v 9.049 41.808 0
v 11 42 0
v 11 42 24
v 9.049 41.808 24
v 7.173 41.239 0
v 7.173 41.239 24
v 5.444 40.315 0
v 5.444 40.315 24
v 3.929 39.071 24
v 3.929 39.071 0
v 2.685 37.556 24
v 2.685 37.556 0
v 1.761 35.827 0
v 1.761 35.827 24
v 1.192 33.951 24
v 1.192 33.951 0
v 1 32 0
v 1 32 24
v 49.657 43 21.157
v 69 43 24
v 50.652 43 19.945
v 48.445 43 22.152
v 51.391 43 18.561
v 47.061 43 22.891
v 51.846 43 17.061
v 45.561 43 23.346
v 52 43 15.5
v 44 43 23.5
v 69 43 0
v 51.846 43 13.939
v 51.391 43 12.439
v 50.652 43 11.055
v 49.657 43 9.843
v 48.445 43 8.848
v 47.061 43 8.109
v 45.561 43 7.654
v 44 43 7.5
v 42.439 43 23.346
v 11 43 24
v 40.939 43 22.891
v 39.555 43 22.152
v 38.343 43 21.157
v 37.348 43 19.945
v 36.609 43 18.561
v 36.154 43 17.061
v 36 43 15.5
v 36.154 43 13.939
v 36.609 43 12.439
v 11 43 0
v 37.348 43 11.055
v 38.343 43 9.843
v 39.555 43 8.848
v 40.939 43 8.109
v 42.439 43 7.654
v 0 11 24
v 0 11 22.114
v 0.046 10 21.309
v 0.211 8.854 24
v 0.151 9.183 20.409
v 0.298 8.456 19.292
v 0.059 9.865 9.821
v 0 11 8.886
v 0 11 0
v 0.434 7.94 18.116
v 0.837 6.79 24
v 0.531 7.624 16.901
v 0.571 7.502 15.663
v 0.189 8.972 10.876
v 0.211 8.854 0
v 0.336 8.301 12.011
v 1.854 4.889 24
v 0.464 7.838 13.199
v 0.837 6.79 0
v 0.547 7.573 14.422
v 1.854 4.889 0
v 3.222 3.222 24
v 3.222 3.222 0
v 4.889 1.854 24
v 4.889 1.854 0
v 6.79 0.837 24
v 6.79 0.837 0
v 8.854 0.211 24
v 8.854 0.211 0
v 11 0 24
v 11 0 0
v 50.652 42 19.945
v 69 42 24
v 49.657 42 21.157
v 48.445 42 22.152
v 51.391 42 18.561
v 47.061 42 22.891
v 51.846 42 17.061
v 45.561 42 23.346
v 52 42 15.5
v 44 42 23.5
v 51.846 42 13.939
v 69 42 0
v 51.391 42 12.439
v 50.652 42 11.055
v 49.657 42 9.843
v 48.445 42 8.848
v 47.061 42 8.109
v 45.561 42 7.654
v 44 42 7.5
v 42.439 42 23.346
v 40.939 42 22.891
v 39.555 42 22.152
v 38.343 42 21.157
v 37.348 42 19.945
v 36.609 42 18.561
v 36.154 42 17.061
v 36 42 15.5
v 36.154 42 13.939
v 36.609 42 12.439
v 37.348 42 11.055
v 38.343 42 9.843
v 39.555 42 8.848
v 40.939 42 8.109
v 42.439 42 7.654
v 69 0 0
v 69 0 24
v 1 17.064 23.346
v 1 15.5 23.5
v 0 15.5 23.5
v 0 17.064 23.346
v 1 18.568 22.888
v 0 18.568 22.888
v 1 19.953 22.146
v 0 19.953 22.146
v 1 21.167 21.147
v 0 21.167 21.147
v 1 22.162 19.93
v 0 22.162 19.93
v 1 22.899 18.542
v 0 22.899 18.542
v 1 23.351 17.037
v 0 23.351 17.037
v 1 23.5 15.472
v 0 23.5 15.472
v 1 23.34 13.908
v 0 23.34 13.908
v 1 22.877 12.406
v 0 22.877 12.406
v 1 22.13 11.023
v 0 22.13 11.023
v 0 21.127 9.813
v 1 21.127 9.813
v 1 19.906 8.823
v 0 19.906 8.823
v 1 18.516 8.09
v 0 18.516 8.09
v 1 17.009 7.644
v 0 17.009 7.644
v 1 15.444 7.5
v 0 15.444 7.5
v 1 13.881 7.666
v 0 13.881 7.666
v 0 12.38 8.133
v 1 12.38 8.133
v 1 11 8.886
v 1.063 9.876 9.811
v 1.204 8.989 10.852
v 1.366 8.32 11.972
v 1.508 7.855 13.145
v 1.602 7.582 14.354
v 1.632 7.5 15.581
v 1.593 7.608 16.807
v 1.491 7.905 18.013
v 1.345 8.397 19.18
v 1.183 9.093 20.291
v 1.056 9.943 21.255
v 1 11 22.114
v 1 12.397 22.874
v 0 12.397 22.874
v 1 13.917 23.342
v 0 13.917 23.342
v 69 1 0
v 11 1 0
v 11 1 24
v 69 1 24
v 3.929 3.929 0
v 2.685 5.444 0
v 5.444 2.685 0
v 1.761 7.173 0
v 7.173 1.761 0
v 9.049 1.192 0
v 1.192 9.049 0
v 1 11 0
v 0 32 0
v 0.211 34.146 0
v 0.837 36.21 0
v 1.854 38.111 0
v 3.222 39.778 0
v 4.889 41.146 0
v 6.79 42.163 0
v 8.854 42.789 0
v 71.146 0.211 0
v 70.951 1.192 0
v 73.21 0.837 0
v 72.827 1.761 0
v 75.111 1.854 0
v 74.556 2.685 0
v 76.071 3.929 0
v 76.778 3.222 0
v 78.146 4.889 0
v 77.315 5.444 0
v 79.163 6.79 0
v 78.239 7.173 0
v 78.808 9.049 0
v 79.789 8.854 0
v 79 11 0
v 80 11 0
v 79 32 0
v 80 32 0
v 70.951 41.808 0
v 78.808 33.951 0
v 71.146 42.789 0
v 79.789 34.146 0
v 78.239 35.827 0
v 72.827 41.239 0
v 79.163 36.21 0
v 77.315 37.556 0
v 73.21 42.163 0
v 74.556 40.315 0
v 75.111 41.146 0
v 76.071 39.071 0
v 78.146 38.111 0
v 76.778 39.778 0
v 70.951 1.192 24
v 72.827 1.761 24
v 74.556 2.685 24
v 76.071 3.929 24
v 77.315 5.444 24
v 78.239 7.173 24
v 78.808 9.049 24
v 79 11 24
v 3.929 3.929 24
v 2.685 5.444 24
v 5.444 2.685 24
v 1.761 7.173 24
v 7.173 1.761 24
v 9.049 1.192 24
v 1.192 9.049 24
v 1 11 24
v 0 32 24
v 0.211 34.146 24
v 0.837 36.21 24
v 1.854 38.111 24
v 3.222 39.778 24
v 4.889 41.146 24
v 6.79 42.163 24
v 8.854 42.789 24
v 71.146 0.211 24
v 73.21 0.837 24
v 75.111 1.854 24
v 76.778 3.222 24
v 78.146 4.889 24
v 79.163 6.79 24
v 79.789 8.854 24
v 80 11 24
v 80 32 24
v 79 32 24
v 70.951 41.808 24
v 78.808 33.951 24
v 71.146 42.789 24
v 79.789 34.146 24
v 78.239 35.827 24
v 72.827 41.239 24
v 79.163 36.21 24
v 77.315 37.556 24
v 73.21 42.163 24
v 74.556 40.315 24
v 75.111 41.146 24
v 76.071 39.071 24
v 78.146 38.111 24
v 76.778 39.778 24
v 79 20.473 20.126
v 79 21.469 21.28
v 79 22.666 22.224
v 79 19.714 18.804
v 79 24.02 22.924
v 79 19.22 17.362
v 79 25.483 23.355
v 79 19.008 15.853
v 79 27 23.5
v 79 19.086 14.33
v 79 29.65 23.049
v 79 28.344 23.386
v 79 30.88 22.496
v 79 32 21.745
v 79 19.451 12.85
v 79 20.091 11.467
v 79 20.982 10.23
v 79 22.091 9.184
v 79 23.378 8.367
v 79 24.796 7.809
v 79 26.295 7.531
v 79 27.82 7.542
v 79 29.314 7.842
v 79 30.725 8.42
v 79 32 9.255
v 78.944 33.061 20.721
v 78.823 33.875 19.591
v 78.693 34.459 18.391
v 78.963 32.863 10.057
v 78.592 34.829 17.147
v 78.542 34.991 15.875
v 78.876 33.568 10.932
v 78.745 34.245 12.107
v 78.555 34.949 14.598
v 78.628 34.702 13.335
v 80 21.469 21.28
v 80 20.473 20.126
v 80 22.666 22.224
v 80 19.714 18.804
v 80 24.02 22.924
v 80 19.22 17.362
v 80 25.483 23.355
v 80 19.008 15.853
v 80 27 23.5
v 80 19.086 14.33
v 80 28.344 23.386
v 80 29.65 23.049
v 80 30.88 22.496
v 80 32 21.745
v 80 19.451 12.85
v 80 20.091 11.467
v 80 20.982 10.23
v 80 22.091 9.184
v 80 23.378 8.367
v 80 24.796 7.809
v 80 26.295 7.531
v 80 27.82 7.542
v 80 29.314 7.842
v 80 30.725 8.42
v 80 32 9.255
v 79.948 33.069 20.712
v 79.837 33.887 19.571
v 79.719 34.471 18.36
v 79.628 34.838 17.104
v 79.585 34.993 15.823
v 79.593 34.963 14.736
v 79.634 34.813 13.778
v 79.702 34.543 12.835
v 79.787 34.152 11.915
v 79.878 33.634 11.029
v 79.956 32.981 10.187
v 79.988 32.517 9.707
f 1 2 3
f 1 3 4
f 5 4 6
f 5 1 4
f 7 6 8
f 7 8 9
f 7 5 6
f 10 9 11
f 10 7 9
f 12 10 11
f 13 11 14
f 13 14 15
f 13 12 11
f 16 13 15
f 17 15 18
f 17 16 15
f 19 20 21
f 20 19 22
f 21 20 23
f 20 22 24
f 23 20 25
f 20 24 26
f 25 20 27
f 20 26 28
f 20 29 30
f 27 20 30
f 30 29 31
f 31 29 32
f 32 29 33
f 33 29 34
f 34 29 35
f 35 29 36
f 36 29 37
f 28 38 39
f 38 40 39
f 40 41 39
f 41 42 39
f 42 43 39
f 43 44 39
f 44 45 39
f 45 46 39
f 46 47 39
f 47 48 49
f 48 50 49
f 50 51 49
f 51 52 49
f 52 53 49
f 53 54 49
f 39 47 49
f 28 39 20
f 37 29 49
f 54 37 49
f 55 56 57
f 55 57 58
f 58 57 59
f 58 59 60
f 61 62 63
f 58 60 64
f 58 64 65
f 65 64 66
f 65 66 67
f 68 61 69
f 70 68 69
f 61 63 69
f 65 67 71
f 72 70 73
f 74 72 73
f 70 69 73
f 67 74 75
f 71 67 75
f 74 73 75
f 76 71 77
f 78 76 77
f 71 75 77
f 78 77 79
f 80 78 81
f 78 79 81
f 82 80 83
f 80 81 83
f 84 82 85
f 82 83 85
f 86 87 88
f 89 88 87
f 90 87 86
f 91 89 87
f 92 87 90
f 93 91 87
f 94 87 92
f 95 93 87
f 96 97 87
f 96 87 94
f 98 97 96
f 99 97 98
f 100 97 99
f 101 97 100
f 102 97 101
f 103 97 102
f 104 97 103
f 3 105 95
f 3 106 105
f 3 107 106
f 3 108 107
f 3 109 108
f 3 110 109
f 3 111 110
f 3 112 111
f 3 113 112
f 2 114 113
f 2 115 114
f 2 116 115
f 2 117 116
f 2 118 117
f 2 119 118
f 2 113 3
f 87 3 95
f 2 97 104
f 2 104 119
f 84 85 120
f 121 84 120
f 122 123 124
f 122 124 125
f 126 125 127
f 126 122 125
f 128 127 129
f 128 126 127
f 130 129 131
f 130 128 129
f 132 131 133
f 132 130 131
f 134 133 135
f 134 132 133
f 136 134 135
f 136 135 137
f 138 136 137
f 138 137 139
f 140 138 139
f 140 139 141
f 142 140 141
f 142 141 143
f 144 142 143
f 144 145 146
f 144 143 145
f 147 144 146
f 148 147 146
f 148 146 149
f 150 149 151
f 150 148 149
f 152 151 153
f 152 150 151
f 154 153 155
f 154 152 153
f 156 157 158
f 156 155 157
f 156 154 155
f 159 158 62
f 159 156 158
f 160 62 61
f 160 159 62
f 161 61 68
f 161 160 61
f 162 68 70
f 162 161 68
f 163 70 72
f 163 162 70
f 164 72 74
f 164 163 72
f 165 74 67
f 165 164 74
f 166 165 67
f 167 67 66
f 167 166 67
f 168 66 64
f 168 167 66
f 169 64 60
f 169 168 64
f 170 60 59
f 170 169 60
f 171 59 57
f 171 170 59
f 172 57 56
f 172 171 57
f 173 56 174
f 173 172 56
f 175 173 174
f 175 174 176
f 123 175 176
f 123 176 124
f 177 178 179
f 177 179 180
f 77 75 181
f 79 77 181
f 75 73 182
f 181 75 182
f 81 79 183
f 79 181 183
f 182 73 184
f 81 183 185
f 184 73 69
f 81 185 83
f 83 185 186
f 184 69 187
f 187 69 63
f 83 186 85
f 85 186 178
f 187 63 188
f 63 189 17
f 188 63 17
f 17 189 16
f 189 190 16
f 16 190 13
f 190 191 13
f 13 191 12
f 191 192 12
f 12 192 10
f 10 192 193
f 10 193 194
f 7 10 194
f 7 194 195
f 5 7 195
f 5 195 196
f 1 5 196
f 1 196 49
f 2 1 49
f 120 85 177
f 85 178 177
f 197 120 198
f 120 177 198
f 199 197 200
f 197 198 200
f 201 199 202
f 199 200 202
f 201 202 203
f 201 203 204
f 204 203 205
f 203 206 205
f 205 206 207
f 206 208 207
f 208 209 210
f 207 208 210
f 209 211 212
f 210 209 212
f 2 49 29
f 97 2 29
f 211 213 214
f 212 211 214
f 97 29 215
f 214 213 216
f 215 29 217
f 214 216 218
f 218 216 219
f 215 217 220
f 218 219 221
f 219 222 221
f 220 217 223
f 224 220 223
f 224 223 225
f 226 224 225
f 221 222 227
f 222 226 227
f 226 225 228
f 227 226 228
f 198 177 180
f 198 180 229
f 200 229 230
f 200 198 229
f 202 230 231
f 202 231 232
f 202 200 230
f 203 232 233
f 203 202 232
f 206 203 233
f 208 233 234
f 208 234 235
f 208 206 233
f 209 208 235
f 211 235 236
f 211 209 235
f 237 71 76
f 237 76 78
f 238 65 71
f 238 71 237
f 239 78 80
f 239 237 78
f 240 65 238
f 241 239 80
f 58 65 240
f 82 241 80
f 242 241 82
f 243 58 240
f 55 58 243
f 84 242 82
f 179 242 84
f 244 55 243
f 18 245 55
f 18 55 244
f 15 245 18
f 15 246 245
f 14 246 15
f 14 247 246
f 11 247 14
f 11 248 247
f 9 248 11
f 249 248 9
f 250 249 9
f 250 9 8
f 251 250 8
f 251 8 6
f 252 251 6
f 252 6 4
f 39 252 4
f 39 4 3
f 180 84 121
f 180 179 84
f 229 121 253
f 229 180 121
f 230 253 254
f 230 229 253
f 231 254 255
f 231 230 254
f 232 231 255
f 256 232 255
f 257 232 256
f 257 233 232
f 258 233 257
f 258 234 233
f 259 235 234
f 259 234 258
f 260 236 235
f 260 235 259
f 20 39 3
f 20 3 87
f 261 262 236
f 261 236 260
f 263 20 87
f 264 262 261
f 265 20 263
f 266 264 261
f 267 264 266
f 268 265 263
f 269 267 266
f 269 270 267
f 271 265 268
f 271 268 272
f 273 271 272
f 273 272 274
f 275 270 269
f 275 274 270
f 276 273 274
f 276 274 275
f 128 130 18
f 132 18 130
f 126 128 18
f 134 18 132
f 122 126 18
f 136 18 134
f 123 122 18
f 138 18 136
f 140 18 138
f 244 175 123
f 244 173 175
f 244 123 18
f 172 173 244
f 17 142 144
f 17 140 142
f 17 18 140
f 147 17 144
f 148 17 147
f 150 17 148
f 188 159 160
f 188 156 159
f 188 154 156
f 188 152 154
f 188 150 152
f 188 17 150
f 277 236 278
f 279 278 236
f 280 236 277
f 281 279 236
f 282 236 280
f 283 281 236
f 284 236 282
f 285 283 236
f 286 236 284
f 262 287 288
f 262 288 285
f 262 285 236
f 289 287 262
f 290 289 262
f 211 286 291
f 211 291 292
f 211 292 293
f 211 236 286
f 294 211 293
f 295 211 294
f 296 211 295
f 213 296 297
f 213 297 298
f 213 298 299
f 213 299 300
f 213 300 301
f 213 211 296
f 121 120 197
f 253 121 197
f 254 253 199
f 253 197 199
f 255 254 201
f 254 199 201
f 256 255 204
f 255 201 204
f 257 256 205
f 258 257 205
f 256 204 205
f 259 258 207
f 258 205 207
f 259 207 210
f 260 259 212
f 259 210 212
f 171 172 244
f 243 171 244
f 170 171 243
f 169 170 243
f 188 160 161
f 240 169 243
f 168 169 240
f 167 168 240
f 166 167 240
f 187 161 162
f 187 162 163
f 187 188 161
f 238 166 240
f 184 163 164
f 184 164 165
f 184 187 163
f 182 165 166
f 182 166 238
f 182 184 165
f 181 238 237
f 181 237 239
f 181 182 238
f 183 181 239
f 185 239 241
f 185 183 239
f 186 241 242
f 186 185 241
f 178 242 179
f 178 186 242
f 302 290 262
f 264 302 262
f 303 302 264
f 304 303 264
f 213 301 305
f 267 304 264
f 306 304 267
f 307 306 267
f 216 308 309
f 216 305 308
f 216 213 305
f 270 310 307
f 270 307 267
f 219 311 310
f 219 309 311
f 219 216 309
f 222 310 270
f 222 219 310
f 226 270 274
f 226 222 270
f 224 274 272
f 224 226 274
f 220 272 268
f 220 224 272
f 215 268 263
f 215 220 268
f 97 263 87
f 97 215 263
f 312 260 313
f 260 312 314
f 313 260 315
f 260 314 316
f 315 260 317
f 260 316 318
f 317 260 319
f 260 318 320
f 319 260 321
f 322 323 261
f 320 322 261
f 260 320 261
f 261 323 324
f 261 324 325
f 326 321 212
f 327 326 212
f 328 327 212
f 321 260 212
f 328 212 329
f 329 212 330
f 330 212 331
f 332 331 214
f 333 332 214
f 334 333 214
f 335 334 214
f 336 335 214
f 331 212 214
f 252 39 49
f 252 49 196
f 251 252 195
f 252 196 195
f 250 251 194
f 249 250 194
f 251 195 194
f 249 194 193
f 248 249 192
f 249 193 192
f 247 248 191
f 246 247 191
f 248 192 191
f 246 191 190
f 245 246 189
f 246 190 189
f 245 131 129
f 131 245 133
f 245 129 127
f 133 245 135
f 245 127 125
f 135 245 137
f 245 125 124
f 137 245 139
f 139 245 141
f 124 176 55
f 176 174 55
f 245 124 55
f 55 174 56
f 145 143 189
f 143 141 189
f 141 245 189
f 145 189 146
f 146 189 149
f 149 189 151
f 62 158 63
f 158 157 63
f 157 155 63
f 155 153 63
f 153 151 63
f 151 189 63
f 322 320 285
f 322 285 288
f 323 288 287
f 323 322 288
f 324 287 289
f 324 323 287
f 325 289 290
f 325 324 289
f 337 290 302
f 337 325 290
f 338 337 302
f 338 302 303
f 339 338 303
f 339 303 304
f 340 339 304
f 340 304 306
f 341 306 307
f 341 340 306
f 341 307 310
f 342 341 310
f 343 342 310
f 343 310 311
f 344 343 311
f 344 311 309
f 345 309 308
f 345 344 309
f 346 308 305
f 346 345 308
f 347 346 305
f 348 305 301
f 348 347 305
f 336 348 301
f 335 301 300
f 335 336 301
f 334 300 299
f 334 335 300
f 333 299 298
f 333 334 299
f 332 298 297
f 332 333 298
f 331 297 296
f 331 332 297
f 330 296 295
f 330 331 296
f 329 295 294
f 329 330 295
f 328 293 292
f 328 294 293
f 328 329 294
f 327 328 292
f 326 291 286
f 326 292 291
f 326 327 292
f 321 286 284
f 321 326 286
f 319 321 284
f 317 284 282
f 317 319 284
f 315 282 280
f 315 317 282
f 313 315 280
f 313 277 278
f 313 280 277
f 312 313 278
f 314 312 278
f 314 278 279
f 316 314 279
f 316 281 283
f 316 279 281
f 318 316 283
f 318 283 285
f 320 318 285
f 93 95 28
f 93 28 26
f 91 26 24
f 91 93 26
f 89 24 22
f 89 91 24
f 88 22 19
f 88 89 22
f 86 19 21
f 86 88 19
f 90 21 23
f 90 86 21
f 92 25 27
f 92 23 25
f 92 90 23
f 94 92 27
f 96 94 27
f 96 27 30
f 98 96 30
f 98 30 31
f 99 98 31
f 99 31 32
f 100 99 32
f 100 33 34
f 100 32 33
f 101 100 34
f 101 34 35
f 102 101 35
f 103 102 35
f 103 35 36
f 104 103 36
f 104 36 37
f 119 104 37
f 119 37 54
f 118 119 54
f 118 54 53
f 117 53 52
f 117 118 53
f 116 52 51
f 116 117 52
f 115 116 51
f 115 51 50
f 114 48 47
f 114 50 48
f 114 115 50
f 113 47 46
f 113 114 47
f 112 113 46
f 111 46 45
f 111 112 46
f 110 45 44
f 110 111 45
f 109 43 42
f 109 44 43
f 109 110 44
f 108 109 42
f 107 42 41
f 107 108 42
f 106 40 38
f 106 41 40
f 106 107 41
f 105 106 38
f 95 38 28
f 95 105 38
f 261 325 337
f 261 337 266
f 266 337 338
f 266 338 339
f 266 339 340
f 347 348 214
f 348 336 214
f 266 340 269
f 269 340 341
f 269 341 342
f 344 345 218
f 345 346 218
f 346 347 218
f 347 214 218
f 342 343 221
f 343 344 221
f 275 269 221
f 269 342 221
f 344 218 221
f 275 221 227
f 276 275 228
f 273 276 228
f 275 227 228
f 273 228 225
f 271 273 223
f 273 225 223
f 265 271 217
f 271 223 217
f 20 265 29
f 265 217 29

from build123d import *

# Parameters (mm, degrees)
CYLINDER033_R     = 8
CYLINDER033_DEPTH = 10
CYLINDER034_R     = 8
CYLINDER034_DEPTH = 10
CYLINDER042_R     = 8
CYLINDER042_DEPTH = 10
PAD_DEPTH         = 24


with BuildPart() as b_w:
    # Cylinder033 → Cylinder033 (new body)
    with BuildSketch(Plane(origin=(5, 15.5, 15.5), x_dir=(0, 0, 1), z_dir=(-1, 0, 0))):
        Circle(CYLINDER033_R)
    extrude(amount=CYLINDER033_DEPTH)


with BuildPart() as b_o:
    # Cylinder034 → Cylinder034 (new body)
    with BuildSketch(Plane(origin=(85, 27, 15.5), x_dir=(0, 0, 1), z_dir=(-1, 0, 0))):
        Circle(CYLINDER034_R)
    extrude(amount=CYLINDER034_DEPTH)


with BuildPart() as b_n001:
    # Cylinder042 → Cylinder042 (new body)
    with BuildSketch(Plane(origin=(44, 38, 15.5), x_dir=(0, 0, 1), z_dir=(0, 1, 0))):
        Circle(CYLINDER042_R)
    extrude(amount=CYLINDER042_DEPTH)


with BuildPart() as cut034:
    # Sketch → Pad (new body)
    with BuildSketch(Plane.XY):
        with BuildLine():
            Line((11, 0), (69, 0))
            ThreePointArc((69, 0), (76.778175, 3.221825), (80, 11))
            Line((80, 11), (80, 32))
            ThreePointArc((80, 32), (76.778175, 39.778175), (69, 43))
            Line((69, 43), (11, 43))
            ThreePointArc((11, 43), (3.221825, 39.778175), (0, 32))
            Line((0, 32), (0, 11))
            ThreePointArc((0, 11), (3.221825, 3.221825), (11, 0))
        make_face()
        with BuildLine():
            Line((11, 1), (69, 1))
            ThreePointArc((69, 1), (76.071068, 3.928932), (79, 11))
            Line((79, 11), (79, 32))
            ThreePointArc((79, 32), (76.071068, 39.071068), (69, 42))
            Line((69, 42), (11, 42))
            ThreePointArc((11, 42), (3.928932, 39.071068), (1, 32))
            Line((1, 32), (1, 11))
            ThreePointArc((1, 11), (3.928932, 3.928932), (11, 1))
        make_face(mode=Mode.SUBTRACT)
    extrude(amount=PAD_DEPTH)

    # Cut032: cut B_N001
    add(b_n001.part, mode=Mode.SUBTRACT)

    # Cut033: cut B_O
    add(b_o.part, mode=Mode.SUBTRACT)

    # Cut034: cut B_W
    add(b_w.part, mode=Mode.SUBTRACT)


solid = cut034.part
